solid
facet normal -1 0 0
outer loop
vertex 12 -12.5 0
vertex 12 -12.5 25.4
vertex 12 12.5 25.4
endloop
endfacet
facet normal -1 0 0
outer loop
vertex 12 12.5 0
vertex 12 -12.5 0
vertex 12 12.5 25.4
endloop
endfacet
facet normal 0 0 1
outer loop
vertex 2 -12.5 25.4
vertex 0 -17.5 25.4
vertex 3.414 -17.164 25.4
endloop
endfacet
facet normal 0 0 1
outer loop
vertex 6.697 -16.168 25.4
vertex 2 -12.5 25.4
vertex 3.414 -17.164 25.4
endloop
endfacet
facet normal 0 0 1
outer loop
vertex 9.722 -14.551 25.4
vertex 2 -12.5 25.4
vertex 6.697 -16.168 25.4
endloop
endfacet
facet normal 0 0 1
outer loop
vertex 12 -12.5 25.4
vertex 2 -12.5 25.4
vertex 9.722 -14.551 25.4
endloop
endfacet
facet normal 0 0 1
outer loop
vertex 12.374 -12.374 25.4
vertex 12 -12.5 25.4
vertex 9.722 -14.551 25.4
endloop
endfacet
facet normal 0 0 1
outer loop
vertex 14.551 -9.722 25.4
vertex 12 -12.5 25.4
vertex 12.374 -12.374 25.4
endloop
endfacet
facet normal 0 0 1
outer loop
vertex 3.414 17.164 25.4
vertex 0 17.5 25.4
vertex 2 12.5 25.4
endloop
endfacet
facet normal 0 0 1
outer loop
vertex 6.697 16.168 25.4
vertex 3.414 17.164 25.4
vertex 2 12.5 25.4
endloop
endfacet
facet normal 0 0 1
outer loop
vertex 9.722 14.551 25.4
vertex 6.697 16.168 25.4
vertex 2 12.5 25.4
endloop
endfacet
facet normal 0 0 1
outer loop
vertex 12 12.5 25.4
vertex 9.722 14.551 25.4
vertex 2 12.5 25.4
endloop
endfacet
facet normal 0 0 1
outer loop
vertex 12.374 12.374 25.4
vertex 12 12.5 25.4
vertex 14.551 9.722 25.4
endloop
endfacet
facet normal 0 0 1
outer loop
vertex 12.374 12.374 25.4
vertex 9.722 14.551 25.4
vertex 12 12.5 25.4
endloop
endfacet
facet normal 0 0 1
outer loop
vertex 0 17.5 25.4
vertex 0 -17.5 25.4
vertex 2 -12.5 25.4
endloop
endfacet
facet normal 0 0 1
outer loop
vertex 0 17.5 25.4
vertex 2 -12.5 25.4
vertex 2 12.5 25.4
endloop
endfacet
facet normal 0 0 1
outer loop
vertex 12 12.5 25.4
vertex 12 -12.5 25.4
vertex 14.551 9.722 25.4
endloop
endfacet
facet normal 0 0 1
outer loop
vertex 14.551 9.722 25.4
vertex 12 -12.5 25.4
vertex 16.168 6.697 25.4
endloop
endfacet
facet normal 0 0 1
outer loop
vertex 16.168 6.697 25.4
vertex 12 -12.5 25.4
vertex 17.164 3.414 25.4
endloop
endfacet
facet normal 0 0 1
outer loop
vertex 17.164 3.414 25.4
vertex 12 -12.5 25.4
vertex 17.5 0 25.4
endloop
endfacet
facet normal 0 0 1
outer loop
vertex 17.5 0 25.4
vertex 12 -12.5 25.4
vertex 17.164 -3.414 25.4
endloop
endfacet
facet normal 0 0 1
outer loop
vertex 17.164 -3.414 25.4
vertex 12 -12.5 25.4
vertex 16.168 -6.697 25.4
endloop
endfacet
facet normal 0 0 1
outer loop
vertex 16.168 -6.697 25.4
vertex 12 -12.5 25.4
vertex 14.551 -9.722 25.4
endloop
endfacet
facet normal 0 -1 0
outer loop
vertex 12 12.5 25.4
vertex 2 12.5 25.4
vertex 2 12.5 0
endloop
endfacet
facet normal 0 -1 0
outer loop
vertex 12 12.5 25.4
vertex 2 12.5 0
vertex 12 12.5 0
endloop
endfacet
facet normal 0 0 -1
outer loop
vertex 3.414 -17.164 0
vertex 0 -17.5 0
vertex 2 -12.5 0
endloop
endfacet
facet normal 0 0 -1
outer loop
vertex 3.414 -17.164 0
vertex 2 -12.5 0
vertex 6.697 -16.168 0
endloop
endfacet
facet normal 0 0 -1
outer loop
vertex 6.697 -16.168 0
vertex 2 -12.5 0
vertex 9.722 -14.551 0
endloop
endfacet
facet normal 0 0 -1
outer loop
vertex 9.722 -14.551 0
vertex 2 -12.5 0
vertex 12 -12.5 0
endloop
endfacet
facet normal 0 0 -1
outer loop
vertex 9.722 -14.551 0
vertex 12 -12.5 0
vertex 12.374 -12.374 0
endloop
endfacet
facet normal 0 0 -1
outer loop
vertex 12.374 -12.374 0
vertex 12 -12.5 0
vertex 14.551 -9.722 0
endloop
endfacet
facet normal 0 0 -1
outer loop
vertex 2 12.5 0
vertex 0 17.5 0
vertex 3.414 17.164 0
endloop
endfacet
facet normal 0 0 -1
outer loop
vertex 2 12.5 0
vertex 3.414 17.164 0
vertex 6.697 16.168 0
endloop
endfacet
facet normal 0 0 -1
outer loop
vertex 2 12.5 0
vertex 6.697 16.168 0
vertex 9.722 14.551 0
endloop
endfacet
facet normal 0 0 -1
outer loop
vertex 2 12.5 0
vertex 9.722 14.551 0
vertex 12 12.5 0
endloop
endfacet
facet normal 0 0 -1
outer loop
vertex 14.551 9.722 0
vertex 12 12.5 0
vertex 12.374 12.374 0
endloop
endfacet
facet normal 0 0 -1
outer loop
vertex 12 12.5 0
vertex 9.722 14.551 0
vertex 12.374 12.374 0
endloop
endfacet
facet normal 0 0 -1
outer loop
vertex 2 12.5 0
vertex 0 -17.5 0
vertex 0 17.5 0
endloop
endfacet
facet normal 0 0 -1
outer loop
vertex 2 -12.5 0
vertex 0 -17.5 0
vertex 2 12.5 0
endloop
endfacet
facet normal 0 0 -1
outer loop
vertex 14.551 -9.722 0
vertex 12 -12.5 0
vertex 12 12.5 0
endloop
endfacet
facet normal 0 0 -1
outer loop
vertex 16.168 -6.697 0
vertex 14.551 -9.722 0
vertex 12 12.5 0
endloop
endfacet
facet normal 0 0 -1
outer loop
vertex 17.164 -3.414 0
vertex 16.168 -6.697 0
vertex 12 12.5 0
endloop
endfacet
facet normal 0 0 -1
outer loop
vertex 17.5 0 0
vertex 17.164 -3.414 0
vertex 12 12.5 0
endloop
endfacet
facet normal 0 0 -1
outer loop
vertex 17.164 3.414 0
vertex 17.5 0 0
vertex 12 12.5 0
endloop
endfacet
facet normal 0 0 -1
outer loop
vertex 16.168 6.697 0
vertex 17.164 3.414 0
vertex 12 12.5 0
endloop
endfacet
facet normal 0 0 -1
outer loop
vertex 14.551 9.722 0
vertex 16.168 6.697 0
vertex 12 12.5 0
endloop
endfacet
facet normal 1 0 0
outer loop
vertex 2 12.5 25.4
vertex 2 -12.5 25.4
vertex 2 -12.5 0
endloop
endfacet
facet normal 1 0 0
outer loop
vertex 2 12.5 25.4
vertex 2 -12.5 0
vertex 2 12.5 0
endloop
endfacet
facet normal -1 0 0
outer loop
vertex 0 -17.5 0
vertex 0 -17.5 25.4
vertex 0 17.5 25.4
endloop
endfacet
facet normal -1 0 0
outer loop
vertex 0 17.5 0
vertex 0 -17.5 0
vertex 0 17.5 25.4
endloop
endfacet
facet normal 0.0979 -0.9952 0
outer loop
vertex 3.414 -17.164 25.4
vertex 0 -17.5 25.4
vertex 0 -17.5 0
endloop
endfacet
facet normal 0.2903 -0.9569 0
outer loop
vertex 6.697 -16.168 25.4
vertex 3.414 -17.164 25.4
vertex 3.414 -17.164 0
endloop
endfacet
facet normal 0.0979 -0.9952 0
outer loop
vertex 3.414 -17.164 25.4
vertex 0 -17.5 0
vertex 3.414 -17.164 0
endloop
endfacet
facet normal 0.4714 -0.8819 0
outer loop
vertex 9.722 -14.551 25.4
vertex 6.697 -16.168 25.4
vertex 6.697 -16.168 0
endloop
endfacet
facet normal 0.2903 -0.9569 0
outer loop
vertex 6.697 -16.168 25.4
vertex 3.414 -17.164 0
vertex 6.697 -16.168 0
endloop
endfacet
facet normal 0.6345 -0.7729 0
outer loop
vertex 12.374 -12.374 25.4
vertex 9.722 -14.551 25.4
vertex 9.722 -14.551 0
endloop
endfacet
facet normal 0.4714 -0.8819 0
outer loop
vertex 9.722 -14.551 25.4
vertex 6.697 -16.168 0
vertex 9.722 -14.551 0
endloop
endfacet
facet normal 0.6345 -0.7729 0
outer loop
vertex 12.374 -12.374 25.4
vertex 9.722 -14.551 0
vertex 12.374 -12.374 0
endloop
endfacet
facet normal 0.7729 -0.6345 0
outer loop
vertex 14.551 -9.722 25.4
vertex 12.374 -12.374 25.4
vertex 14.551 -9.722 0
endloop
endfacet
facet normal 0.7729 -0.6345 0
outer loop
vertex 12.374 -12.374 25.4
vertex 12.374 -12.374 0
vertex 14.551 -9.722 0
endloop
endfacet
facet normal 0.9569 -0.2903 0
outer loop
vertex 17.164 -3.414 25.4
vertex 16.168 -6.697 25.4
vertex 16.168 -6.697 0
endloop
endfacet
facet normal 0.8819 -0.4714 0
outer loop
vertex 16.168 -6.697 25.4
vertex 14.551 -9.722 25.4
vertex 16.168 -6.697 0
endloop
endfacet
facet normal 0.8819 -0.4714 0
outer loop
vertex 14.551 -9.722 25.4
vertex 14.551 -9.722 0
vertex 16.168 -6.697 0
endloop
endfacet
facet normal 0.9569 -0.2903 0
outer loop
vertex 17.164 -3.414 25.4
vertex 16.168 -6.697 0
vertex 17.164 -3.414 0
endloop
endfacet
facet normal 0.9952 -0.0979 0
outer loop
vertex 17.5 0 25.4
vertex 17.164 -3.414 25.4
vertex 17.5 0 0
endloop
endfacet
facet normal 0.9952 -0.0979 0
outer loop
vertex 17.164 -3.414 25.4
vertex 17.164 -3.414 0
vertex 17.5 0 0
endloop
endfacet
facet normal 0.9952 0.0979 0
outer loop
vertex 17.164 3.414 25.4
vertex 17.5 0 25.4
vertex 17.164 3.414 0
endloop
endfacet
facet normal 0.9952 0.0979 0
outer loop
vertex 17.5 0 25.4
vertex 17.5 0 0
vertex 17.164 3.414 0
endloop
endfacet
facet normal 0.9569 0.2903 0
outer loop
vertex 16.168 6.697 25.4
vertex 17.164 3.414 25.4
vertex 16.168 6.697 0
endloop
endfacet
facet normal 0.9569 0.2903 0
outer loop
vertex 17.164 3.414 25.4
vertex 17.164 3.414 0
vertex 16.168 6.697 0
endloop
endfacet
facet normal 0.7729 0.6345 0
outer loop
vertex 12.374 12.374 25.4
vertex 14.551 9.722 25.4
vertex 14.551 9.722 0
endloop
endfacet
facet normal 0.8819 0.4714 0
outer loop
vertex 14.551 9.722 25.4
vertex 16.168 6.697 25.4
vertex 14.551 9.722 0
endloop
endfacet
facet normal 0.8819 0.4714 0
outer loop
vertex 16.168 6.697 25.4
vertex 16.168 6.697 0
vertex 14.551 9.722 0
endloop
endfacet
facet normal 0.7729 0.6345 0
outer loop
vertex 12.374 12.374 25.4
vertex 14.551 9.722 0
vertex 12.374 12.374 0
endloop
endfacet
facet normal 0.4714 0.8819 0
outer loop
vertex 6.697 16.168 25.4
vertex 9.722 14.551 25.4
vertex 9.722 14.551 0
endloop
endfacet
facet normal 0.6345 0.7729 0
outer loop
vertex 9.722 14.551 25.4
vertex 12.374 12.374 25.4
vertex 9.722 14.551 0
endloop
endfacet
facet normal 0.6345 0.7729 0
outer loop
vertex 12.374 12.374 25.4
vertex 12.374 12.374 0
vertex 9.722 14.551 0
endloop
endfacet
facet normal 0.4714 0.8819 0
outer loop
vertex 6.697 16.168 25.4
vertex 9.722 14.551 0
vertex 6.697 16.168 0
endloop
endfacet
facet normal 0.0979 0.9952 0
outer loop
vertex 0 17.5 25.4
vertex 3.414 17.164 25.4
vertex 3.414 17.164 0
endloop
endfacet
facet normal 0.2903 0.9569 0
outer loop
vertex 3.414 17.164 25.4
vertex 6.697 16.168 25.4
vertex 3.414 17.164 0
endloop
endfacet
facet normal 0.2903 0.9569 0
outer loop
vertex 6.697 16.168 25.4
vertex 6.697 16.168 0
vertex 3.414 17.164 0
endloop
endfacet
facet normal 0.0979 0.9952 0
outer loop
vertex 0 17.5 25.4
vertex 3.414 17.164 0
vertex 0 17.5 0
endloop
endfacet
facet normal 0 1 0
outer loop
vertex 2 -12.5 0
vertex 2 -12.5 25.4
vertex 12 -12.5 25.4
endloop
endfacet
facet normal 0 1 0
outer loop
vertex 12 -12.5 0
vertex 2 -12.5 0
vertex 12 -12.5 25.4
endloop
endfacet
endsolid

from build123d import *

# Parameters (mm, degrees)
F0_R     = 17.5
F1_DEPTH = 25.4
F2_W     = 60.77839
F2_H     = 43.169699
F3_DEPTH = 25.4
F4_W     = 10
F4_H     = 25
F5_DEPTH = 40


with BuildPart() as f1:
    # F0 (on Top) → F1 (new body)
    with BuildSketch(Plane.XY):
        Circle(F0_R)
    extrude(amount=F1_DEPTH)

    # F2 (on Right) → F3 (cut)
    with BuildSketch(Plane.YZ):
        with Locations((0, 15.174311)):
            Rectangle(F2_W, F2_H)
    extrude(amount=-F3_DEPTH, mode=Mode.SUBTRACT)

    # F4 (on face) → F5 (cut)
    with BuildSketch(Plane.XY.offset(25.4)):
        with Locations((7, 0)):
            Rectangle(F4_W, F4_H)
    extrude(amount=-F5_DEPTH, mode=Mode.SUBTRACT)


solid = f1.part
